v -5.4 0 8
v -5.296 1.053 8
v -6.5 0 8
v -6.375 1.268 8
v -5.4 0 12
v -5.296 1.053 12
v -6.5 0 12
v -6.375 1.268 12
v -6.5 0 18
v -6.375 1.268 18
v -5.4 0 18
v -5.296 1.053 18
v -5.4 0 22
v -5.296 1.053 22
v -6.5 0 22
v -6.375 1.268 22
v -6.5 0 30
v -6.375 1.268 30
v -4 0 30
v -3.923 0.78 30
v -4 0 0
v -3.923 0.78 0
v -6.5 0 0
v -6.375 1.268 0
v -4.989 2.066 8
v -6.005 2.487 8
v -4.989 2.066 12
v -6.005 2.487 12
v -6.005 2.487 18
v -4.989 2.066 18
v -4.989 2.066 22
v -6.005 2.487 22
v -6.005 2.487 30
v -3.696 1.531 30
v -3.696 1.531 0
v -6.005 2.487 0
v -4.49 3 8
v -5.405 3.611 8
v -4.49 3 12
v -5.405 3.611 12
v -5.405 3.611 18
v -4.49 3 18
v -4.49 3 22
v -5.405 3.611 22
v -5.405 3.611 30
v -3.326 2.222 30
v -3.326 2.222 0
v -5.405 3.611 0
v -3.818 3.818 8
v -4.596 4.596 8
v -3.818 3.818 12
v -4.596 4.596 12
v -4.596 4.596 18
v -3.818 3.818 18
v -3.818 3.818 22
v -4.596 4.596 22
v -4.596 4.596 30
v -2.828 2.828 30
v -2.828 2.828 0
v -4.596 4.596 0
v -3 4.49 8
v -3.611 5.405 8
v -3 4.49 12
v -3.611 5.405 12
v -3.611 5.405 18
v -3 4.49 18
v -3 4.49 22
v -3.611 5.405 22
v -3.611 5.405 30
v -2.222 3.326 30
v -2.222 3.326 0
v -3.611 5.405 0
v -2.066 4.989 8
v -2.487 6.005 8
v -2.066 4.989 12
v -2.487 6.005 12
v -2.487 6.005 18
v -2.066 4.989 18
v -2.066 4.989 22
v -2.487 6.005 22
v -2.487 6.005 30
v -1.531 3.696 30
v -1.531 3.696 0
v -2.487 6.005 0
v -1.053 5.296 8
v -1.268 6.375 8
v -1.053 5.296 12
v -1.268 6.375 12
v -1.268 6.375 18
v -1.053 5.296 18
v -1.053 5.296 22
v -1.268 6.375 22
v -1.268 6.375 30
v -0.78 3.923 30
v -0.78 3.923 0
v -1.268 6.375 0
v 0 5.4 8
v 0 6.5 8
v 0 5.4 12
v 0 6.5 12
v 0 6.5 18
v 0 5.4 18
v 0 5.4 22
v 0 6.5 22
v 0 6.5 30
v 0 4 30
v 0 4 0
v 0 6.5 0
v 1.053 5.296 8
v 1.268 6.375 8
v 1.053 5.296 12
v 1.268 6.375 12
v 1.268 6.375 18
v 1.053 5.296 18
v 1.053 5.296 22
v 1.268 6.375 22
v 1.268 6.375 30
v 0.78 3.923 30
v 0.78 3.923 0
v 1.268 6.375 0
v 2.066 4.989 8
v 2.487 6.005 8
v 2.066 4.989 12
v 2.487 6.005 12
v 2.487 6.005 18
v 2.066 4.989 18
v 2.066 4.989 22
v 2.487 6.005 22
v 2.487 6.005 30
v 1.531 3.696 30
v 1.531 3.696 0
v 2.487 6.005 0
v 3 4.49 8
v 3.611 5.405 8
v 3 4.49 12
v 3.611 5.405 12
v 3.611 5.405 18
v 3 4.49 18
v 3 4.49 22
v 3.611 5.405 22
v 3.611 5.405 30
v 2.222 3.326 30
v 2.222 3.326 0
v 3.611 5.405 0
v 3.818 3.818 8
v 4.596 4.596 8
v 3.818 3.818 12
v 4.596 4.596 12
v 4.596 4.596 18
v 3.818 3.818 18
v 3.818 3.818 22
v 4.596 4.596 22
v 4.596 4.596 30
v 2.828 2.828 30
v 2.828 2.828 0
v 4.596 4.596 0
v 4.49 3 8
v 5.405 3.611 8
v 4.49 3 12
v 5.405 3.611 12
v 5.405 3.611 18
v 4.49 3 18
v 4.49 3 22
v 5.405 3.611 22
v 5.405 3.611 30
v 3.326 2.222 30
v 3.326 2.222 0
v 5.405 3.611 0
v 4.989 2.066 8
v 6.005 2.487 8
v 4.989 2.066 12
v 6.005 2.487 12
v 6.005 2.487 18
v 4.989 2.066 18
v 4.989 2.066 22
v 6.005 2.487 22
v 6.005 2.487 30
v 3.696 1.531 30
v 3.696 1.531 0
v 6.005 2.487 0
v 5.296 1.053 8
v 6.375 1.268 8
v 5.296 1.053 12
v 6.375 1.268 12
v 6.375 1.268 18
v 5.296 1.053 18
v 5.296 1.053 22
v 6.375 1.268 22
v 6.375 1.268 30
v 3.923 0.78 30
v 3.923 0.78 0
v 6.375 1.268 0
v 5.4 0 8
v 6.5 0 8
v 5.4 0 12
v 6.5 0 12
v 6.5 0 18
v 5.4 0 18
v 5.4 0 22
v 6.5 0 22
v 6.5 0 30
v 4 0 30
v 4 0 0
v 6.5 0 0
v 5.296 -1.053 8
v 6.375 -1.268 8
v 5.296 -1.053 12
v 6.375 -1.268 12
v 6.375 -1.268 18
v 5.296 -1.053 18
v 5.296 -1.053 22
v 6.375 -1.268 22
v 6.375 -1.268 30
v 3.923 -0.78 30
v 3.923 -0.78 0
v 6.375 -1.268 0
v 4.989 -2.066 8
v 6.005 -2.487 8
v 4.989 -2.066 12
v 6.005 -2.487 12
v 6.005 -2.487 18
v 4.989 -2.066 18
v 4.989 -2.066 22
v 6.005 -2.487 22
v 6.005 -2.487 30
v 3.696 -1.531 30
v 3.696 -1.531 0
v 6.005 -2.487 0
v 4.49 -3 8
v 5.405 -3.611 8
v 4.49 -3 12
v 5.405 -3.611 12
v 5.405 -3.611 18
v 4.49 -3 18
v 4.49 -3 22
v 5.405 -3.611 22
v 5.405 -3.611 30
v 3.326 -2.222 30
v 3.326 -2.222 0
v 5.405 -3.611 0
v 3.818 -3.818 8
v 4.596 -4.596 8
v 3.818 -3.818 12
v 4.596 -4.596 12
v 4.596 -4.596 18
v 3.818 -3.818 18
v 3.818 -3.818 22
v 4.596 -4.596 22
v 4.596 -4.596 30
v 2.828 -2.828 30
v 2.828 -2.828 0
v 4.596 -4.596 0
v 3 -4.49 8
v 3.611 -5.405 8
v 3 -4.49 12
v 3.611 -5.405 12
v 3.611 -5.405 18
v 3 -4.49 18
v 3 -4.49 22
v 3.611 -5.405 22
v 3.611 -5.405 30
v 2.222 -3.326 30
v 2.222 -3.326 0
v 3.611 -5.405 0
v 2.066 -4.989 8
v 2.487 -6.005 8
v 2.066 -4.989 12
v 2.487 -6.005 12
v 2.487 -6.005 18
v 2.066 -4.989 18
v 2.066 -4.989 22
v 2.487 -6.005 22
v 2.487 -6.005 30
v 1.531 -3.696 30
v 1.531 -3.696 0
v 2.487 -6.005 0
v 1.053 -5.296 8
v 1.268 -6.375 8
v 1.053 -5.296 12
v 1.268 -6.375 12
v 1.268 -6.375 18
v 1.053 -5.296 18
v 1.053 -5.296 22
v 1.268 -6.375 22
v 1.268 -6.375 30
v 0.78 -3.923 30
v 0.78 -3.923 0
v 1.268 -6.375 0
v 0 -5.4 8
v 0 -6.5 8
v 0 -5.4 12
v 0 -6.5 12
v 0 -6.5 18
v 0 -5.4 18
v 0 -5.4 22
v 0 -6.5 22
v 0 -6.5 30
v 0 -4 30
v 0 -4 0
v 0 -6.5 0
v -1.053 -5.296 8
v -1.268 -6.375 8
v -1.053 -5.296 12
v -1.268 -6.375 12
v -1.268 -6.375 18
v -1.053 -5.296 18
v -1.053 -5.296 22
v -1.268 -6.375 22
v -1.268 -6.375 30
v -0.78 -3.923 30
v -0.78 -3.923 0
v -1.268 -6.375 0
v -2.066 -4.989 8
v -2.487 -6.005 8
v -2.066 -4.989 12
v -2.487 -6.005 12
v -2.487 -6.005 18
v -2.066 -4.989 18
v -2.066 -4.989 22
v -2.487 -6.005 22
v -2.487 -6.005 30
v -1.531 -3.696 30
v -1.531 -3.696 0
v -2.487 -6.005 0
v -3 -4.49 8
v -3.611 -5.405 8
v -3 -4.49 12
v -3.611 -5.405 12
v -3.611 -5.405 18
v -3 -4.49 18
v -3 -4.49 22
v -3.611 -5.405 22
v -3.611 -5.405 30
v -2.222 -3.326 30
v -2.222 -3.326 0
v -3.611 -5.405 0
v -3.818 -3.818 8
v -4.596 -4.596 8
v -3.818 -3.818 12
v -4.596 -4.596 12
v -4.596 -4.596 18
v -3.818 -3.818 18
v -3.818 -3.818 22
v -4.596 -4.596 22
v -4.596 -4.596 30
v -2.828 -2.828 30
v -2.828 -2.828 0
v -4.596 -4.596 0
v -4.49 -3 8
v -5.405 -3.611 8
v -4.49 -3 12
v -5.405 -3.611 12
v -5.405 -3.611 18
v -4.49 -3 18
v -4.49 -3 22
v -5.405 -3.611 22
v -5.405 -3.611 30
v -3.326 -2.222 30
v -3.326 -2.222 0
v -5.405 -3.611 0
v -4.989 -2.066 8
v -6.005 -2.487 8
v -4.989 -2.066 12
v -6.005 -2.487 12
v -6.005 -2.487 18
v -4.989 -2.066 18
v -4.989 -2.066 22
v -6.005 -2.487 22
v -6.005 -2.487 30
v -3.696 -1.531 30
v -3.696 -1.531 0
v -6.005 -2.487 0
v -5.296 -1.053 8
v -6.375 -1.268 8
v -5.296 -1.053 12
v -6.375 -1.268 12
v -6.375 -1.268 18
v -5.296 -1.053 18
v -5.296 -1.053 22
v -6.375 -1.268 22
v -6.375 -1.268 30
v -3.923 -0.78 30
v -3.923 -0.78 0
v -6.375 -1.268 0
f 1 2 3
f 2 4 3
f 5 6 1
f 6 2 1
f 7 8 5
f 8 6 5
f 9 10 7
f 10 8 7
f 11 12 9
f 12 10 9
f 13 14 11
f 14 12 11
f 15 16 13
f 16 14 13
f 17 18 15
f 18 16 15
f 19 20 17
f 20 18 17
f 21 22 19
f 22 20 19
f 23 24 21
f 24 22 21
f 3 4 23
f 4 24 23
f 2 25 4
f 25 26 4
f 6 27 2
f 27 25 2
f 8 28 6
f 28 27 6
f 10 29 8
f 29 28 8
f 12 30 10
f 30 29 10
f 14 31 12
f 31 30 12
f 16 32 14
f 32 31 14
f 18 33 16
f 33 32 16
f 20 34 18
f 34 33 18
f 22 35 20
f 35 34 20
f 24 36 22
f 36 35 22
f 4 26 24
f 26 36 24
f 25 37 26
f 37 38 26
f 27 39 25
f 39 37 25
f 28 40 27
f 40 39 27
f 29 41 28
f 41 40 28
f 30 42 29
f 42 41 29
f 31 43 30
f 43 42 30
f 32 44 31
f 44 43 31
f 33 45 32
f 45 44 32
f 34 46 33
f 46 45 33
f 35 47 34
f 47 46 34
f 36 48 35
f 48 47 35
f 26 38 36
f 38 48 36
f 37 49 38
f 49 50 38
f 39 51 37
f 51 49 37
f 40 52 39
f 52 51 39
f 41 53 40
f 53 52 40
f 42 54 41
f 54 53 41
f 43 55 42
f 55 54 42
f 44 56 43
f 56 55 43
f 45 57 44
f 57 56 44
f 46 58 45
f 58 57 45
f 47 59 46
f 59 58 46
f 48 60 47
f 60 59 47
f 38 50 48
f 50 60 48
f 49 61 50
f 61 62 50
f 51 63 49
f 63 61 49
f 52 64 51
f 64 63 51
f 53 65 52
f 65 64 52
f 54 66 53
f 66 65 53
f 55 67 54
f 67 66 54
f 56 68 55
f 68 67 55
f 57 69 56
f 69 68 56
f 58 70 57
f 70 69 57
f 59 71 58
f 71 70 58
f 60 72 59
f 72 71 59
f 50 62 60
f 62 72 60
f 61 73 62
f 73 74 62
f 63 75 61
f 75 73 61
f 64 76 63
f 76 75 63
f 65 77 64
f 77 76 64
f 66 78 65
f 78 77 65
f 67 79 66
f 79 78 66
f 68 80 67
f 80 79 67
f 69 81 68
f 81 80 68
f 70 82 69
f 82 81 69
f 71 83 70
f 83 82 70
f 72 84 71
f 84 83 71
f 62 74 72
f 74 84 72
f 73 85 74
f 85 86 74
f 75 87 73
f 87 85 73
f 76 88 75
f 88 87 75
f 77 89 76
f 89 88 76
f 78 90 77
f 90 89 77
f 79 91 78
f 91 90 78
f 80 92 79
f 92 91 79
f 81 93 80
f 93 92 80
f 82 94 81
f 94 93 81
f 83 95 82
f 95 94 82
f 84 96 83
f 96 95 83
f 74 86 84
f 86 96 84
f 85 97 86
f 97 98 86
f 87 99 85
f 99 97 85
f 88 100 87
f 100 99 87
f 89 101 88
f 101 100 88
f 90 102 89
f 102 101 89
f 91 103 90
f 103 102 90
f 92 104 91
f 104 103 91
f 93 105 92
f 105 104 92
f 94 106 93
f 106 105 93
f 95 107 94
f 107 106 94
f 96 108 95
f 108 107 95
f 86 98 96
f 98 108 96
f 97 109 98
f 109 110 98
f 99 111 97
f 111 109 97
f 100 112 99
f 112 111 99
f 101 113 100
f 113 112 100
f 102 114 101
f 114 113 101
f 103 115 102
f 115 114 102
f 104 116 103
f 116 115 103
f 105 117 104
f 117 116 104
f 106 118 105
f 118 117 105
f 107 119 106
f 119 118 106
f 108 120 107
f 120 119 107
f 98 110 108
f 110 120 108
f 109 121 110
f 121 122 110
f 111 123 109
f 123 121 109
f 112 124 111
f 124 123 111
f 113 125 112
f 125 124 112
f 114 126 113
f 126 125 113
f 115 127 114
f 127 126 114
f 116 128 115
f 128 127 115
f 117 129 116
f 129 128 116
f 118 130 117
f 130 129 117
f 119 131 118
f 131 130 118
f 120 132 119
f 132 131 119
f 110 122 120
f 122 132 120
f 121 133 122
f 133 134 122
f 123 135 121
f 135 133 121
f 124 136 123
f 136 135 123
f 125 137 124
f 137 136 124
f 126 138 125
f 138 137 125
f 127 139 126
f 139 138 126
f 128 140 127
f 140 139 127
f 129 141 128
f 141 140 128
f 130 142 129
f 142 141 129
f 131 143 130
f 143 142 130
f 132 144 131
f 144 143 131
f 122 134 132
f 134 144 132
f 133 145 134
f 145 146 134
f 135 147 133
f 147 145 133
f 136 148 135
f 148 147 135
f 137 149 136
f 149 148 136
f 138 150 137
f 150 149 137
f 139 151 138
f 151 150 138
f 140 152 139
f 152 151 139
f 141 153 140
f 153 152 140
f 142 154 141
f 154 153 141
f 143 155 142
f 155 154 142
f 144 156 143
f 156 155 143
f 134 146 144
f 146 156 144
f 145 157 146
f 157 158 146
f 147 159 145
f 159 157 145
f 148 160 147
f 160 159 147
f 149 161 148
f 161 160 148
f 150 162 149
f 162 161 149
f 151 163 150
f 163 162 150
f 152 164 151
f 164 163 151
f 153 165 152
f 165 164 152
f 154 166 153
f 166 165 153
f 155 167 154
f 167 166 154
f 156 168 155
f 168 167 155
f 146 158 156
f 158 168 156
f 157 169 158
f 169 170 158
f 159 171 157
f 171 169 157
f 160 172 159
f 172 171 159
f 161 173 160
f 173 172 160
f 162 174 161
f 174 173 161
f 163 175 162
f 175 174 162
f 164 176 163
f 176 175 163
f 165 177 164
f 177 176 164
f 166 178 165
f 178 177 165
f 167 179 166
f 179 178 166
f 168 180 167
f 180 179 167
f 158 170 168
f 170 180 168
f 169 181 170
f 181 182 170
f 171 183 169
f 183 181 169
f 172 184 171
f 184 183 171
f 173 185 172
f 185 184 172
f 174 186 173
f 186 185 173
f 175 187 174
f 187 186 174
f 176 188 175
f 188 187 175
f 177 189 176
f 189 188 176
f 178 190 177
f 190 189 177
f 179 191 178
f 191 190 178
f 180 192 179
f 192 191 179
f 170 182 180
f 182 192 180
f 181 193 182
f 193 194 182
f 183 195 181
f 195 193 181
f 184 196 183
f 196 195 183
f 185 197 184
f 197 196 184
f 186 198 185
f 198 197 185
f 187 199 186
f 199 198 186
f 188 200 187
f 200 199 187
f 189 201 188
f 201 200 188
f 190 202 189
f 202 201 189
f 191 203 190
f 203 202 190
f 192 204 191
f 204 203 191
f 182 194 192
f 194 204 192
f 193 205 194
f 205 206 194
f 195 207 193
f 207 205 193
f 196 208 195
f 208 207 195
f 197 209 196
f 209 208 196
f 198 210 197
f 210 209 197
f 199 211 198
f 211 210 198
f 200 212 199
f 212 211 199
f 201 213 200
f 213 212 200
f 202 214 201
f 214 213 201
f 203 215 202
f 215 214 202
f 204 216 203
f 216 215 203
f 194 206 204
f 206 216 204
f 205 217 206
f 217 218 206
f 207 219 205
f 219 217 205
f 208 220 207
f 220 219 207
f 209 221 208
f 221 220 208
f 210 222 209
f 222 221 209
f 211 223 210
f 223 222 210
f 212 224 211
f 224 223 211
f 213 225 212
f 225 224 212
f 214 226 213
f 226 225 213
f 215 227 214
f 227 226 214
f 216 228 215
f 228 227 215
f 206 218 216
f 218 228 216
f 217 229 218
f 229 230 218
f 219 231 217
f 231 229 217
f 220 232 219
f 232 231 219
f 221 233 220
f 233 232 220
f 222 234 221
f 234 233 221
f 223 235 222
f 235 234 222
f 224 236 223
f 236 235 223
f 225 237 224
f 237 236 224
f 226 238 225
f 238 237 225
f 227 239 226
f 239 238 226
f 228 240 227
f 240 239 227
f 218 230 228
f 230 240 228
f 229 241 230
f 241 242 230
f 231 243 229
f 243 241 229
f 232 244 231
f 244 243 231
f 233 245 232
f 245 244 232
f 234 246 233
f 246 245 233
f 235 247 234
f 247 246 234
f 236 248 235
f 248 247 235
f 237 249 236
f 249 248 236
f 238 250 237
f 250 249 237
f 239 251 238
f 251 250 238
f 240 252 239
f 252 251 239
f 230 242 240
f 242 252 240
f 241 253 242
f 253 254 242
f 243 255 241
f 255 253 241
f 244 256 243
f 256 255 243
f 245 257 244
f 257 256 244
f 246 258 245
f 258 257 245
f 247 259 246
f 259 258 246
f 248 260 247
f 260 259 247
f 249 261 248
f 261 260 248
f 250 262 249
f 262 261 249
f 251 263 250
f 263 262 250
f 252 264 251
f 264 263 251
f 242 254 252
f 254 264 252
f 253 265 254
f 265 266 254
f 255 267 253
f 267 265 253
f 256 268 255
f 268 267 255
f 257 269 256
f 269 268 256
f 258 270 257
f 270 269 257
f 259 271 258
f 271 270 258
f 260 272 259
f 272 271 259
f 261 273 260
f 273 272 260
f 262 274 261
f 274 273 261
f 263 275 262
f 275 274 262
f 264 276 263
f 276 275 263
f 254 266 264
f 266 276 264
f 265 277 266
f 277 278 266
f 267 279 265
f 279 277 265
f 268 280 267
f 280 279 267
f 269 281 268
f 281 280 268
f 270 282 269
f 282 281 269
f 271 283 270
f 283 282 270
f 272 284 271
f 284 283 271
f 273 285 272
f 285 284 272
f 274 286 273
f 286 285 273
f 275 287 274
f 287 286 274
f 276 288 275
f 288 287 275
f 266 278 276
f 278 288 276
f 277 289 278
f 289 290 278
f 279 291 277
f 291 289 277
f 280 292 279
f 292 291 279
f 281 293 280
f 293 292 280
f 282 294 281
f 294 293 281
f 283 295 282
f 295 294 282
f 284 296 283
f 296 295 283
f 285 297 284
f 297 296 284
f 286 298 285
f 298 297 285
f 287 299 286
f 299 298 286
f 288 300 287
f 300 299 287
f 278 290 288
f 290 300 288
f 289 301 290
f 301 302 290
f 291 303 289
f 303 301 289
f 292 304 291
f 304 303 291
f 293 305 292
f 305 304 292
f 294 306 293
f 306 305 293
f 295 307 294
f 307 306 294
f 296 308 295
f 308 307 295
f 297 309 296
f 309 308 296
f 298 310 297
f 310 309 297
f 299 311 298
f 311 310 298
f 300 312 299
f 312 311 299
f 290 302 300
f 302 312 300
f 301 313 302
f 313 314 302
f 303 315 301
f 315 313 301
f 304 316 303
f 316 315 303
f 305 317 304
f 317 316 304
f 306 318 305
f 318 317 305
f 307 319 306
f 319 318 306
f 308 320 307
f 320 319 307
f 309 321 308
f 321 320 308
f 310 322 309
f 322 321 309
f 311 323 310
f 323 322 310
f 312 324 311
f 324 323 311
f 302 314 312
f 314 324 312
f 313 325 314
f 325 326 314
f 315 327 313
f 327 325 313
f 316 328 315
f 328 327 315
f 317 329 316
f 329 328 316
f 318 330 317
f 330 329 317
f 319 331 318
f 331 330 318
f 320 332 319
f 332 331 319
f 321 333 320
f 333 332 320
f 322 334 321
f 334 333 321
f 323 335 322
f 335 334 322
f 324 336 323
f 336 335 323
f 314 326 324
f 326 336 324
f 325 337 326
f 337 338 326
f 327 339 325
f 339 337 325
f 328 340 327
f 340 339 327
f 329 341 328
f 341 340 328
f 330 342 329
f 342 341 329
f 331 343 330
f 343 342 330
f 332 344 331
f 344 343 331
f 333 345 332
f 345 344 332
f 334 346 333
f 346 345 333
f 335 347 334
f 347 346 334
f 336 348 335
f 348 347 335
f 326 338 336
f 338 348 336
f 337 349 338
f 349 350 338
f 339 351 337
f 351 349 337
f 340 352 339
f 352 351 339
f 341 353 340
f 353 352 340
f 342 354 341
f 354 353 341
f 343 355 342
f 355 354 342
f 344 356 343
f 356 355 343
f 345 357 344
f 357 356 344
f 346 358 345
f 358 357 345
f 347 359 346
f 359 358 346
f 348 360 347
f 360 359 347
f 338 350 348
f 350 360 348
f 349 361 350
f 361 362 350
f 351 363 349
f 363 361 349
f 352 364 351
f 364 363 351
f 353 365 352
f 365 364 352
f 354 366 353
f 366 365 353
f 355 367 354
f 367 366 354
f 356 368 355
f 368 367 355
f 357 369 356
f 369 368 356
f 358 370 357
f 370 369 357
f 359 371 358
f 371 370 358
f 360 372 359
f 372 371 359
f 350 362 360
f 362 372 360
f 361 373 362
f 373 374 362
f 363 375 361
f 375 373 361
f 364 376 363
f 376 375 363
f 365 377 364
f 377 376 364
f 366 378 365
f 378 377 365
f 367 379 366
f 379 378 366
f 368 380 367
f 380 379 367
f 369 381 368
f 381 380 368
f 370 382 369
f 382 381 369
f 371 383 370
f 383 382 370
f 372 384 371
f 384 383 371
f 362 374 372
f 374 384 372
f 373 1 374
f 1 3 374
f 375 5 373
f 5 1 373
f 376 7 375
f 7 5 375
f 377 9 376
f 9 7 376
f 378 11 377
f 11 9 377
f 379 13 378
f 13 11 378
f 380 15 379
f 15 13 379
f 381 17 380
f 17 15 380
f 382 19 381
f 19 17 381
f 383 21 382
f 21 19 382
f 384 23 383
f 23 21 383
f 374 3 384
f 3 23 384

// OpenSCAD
$fn = 32;

// ----------------------------------------------------------------------
// Grooved revolve: plain_grooves, bore R4
// ----------------------------------------------------------------------

// --- parameters (mm) ---
bore_r = 4;               // bore radius
outer_r = 6.5;            // outer radius of the body
total_h = 30;             // overall height, Z
wall = 2.5;               // radial wall thickness
groove_w = 4;             // groove width
groove_d = 1.1;           // groove depth
grooves = 2;              // number of outer grooves

bbox_x = 2 * outer_r;  // full diameter
bore_d = 2 * bore_r;  // bore diameter
body_d = 2 * outer_r;  // body diameter
revolve_angle = 360;  // full turn around the Z axis

profile = [[4, 0], [6.5, 0], [6.5, 8], [5.4, 8], [5.4, 12], [6.5, 12], [6.5, 18], [5.4, 18], [5.4, 22], [6.5, 22], [6.5, 30], [4, 30]];  // primary outline, 12 points, counter clockwise

// --- the one profile operation ---
rotate_extrude(angle = revolve_angle) polygon(points = profile);
